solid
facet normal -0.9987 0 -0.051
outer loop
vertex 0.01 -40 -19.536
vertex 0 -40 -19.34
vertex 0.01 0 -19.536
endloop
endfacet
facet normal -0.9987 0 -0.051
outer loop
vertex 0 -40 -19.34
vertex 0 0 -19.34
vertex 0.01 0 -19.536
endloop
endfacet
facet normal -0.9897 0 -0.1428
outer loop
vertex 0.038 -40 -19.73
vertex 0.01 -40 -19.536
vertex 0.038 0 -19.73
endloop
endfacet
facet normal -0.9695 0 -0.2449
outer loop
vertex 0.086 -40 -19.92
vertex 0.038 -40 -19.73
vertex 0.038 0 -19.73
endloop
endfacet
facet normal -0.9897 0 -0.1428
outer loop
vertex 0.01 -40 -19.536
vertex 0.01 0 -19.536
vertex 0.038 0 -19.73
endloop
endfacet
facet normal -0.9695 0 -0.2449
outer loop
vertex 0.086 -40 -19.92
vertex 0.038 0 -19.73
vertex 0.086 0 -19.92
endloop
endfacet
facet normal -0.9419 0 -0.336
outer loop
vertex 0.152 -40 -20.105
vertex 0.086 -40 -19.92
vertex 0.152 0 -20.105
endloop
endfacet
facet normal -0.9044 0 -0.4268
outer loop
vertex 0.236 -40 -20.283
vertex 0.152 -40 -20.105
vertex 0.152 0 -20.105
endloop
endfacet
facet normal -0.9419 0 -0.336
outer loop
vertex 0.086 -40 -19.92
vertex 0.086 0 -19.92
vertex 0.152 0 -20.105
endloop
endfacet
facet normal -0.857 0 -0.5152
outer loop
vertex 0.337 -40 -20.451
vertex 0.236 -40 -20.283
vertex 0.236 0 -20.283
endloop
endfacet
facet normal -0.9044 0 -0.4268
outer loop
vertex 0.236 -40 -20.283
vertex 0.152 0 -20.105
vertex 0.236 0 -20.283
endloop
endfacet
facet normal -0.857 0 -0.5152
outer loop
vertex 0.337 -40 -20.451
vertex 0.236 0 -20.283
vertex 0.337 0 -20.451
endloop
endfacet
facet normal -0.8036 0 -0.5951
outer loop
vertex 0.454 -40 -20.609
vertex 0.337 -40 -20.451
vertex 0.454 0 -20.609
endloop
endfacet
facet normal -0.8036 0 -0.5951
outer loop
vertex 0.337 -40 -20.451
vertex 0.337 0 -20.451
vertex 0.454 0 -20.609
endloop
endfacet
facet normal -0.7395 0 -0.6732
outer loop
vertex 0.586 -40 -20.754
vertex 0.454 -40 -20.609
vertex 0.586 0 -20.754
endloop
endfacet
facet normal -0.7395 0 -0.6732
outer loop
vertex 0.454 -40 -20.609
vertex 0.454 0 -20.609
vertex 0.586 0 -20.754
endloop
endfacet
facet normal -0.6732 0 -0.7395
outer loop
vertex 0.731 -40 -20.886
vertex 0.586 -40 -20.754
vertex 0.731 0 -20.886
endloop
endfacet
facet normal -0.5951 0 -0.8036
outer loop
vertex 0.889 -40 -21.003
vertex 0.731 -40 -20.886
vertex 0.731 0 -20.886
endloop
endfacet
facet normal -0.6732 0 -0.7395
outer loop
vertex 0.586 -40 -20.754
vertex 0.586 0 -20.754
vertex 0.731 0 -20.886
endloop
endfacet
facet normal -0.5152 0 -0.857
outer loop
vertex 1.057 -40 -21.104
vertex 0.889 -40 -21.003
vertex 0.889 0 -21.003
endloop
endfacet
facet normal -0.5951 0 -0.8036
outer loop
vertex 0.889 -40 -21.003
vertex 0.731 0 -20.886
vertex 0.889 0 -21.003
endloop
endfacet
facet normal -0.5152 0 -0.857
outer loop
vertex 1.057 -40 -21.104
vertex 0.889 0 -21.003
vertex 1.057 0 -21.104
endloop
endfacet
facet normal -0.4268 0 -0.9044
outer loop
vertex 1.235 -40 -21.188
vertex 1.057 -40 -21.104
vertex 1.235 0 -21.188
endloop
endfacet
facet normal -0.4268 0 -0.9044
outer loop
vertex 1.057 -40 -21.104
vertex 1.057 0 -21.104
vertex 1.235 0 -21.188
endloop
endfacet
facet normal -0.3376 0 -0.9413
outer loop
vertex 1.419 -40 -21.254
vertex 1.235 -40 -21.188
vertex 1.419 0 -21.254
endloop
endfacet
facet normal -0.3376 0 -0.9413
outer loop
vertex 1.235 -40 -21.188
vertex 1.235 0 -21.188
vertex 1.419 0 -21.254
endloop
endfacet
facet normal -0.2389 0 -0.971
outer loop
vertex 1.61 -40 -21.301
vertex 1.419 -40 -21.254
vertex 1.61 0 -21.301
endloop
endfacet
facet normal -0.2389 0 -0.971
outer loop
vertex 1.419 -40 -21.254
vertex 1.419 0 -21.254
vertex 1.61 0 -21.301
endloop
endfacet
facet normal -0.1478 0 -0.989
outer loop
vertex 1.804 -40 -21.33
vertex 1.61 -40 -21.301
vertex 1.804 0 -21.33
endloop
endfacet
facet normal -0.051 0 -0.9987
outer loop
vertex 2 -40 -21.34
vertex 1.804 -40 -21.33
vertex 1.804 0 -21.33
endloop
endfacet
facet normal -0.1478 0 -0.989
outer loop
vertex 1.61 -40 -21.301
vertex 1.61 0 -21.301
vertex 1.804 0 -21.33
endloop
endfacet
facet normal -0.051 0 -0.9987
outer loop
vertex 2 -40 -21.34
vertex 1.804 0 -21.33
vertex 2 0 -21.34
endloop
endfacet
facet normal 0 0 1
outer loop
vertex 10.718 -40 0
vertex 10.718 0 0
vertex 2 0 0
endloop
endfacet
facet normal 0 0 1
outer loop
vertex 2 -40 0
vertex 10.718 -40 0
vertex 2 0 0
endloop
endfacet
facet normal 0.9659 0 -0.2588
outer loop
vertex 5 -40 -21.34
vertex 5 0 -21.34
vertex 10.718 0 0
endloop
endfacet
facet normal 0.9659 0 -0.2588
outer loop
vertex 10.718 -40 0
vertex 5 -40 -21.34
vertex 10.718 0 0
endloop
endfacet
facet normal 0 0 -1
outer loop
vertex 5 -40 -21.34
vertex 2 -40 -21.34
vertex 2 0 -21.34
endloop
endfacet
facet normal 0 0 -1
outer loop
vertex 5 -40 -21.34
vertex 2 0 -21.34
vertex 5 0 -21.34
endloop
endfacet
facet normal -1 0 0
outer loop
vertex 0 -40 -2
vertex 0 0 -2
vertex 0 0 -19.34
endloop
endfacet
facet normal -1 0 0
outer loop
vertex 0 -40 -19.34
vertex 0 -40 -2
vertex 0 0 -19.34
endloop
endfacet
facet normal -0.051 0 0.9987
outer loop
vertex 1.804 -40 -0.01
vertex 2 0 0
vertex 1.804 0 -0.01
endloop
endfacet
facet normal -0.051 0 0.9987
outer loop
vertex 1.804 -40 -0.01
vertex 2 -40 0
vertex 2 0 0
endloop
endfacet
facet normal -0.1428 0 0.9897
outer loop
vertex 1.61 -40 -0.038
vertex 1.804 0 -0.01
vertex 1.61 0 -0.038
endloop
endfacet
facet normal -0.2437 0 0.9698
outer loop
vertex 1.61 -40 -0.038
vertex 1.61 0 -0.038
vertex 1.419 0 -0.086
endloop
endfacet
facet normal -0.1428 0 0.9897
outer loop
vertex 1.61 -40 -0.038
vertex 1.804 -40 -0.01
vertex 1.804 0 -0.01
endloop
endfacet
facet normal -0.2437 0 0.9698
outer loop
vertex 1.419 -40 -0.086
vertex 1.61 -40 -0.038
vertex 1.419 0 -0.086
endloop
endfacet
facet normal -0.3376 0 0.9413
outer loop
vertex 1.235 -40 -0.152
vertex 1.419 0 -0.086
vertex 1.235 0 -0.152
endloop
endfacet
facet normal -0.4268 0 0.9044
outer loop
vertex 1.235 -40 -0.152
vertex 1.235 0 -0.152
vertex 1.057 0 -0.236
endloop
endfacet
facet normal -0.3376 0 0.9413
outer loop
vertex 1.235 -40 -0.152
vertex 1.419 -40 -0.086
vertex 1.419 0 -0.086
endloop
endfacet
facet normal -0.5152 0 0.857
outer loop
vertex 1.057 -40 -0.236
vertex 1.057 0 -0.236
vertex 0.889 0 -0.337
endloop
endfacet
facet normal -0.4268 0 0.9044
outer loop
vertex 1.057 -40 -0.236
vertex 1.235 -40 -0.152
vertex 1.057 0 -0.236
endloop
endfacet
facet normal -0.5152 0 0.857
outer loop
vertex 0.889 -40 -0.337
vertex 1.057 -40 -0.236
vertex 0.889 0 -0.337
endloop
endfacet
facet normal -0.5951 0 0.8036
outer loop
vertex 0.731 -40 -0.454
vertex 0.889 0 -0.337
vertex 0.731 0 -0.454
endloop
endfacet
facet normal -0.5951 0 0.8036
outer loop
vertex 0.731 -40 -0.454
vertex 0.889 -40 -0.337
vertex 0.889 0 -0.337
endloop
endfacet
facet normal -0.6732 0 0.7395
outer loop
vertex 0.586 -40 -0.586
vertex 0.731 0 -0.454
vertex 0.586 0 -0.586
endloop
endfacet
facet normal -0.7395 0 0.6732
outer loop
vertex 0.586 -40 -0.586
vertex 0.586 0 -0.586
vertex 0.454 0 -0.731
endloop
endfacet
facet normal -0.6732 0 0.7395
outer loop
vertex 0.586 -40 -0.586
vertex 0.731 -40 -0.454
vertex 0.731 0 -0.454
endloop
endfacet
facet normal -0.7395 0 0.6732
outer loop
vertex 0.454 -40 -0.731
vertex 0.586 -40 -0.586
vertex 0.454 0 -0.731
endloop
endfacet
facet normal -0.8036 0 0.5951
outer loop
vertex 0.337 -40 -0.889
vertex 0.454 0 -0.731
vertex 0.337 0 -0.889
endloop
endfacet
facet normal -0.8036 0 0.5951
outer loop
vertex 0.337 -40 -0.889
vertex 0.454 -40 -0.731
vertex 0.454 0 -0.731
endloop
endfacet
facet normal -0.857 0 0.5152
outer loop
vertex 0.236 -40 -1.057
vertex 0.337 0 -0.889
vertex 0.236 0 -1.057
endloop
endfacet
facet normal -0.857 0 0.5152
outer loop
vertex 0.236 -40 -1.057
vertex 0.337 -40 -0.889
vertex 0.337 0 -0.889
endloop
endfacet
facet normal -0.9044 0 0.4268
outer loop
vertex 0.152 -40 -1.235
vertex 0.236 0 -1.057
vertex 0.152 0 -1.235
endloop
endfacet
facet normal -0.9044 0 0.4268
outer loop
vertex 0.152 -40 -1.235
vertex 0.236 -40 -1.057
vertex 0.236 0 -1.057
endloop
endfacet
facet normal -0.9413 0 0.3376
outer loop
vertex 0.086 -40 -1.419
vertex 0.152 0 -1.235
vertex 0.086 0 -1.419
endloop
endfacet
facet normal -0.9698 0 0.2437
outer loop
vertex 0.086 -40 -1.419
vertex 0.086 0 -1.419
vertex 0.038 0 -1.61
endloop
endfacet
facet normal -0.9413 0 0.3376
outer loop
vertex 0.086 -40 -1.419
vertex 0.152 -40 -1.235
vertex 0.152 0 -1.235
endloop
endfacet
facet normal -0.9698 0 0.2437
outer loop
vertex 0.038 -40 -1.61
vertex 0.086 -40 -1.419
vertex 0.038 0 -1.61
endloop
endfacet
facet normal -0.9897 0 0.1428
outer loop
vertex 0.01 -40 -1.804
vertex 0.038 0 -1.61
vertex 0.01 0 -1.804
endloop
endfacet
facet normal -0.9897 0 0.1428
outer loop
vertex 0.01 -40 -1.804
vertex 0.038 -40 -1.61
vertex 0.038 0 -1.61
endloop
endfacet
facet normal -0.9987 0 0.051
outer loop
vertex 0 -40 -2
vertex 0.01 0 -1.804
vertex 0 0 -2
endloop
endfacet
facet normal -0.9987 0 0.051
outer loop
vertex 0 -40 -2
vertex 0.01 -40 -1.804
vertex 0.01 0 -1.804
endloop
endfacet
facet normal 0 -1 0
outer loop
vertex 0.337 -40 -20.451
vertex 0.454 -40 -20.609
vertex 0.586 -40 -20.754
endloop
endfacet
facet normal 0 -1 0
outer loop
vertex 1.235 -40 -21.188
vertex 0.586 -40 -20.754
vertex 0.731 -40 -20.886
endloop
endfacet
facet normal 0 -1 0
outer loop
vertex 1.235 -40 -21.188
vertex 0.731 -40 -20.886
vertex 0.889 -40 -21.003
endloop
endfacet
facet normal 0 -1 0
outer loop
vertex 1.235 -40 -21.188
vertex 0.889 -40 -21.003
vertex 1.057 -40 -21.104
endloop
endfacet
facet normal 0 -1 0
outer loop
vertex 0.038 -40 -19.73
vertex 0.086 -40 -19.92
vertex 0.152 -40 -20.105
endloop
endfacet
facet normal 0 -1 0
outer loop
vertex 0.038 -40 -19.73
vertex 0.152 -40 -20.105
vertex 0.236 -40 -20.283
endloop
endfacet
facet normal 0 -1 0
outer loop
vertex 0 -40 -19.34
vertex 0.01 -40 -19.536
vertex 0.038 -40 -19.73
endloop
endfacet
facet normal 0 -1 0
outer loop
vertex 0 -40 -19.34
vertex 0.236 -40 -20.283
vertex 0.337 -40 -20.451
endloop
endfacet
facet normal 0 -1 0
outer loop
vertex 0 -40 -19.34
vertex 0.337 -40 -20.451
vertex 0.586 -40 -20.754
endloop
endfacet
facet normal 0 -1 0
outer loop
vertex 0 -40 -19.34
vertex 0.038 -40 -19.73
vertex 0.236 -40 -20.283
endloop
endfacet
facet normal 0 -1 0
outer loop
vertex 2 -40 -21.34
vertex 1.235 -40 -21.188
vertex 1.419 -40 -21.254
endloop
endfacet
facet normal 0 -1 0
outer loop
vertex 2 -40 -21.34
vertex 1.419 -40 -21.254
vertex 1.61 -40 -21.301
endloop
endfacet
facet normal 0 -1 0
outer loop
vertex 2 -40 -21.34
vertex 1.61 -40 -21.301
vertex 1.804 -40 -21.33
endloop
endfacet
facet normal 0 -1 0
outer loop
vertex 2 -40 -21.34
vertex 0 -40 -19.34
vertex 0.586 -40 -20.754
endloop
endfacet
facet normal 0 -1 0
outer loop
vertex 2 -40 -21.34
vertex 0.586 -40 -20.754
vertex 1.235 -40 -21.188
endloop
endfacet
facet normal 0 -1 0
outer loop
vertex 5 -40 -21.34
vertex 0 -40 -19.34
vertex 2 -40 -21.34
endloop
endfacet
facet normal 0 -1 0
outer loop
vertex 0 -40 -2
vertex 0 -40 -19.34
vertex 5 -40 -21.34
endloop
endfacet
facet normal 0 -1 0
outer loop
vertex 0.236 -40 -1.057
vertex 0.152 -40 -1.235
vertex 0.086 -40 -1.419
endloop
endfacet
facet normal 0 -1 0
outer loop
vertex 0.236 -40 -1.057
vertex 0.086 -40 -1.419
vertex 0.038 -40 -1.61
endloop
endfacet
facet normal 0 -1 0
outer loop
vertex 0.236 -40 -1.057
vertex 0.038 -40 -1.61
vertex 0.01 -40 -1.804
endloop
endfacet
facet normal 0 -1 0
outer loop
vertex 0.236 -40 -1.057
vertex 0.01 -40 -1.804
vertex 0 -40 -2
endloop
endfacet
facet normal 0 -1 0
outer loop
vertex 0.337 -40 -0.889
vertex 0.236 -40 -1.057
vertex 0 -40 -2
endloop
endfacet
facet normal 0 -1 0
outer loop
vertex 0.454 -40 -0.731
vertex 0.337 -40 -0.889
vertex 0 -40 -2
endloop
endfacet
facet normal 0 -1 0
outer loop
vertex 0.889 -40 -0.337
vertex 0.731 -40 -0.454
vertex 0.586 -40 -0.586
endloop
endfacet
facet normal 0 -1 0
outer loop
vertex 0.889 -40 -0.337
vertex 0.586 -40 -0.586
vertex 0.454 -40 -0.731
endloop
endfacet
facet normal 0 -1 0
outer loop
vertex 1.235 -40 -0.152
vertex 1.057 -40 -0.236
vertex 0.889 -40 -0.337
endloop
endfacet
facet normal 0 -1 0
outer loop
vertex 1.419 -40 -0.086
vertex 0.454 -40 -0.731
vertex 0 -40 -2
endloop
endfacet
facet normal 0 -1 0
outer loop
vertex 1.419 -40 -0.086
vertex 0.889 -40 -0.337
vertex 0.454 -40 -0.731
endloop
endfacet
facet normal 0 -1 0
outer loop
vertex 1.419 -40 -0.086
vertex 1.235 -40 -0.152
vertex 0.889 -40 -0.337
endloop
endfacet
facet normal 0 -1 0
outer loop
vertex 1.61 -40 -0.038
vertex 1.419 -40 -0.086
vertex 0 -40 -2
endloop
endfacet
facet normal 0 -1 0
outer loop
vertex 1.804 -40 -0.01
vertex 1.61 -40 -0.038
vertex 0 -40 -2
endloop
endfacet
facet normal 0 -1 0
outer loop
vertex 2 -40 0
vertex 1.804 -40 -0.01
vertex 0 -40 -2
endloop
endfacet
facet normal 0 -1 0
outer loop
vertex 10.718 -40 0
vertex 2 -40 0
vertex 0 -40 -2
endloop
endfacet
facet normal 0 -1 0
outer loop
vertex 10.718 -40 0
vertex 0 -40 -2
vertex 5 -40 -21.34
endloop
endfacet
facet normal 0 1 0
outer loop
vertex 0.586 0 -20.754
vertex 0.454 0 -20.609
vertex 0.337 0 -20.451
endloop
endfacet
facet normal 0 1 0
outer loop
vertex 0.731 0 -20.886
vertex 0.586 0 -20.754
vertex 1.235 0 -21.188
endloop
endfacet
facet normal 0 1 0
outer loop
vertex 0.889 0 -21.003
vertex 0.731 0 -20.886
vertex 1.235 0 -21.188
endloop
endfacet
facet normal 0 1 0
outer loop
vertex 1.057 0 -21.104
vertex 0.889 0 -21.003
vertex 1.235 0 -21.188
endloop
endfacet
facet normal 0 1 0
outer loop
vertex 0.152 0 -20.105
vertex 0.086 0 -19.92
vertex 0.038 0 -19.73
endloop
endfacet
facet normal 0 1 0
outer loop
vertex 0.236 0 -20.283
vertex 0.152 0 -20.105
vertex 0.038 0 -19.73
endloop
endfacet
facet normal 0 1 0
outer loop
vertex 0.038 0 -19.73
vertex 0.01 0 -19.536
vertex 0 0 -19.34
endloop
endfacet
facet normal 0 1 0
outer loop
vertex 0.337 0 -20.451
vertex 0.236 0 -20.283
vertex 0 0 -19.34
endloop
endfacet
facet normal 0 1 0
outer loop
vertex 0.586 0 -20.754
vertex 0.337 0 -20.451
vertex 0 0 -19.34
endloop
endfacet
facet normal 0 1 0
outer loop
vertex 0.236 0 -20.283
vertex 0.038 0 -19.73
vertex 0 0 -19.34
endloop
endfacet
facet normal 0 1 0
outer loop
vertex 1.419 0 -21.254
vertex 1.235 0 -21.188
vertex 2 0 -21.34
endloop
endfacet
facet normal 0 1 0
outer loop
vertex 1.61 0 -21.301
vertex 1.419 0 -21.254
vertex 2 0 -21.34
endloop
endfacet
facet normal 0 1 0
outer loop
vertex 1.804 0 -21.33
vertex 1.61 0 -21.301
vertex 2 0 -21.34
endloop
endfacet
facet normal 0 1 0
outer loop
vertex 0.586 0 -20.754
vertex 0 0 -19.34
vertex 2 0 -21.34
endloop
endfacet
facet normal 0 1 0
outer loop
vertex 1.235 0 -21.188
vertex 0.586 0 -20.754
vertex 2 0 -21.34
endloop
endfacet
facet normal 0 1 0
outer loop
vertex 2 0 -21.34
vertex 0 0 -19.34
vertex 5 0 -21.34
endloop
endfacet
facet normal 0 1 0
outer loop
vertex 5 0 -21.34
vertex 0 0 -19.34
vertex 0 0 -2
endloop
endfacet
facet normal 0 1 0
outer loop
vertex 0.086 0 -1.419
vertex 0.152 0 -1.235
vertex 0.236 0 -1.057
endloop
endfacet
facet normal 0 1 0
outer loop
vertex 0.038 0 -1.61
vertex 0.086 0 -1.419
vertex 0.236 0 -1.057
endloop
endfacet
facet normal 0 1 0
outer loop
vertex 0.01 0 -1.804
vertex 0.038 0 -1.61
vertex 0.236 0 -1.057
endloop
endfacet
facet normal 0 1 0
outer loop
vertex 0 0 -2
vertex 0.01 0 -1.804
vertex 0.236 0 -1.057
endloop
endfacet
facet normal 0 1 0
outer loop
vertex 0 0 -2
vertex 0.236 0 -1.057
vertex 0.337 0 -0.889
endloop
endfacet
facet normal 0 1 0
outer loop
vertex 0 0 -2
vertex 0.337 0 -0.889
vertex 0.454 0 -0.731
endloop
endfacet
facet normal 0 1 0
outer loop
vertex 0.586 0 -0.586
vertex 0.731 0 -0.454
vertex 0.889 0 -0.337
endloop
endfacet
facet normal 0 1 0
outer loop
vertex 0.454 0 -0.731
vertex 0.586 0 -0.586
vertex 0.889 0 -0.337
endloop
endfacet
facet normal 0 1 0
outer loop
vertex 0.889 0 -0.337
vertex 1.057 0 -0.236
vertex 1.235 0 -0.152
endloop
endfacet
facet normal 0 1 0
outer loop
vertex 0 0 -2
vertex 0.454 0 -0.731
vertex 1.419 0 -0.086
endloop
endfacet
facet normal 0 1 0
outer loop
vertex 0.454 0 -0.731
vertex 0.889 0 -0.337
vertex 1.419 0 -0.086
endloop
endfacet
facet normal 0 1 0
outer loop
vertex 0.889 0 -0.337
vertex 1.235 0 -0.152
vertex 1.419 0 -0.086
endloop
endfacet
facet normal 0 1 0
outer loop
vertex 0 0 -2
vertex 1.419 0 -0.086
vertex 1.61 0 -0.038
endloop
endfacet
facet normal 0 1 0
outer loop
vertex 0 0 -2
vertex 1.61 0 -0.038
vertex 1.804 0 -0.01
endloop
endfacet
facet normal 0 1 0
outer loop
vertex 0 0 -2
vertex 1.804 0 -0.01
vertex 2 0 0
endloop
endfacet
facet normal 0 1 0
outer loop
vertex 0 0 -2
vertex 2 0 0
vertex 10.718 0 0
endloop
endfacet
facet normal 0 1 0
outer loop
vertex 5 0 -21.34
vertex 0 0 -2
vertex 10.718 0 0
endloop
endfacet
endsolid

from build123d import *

# Parameters (mm, degrees)
F1_DEPTH = 40
F2_W     = 5
F2_H     = 18.6602540378
F3_DEPTH = 40.001
F4_R     = 2


with BuildPart() as f1:
    # F0 (on Front) → F1 (new body)
    with BuildSketch(Plane.XZ):
        Polygon((10.7179676972, 0), (0, 0), (0, -40), align=None)
    extrude(amount=F1_DEPTH)

    # F2 (on face) → F3 (cut, through all)
    with BuildSketch(Plane.XZ.offset(40)):
        with Locations((2.5, -30.6698729811)):
            Rectangle(F2_W, F2_H)
    extrude(amount=-F3_DEPTH, mode=Mode.SUBTRACT)

    # F4
    f4_edges = [f1.edges().sort_by_distance(p)[0] for p in [
        (0, -20, 0),
        (0, -20, -21.339746),
    ]]
    fillet(f4_edges, radius=F4_R)


solid = f1.part
